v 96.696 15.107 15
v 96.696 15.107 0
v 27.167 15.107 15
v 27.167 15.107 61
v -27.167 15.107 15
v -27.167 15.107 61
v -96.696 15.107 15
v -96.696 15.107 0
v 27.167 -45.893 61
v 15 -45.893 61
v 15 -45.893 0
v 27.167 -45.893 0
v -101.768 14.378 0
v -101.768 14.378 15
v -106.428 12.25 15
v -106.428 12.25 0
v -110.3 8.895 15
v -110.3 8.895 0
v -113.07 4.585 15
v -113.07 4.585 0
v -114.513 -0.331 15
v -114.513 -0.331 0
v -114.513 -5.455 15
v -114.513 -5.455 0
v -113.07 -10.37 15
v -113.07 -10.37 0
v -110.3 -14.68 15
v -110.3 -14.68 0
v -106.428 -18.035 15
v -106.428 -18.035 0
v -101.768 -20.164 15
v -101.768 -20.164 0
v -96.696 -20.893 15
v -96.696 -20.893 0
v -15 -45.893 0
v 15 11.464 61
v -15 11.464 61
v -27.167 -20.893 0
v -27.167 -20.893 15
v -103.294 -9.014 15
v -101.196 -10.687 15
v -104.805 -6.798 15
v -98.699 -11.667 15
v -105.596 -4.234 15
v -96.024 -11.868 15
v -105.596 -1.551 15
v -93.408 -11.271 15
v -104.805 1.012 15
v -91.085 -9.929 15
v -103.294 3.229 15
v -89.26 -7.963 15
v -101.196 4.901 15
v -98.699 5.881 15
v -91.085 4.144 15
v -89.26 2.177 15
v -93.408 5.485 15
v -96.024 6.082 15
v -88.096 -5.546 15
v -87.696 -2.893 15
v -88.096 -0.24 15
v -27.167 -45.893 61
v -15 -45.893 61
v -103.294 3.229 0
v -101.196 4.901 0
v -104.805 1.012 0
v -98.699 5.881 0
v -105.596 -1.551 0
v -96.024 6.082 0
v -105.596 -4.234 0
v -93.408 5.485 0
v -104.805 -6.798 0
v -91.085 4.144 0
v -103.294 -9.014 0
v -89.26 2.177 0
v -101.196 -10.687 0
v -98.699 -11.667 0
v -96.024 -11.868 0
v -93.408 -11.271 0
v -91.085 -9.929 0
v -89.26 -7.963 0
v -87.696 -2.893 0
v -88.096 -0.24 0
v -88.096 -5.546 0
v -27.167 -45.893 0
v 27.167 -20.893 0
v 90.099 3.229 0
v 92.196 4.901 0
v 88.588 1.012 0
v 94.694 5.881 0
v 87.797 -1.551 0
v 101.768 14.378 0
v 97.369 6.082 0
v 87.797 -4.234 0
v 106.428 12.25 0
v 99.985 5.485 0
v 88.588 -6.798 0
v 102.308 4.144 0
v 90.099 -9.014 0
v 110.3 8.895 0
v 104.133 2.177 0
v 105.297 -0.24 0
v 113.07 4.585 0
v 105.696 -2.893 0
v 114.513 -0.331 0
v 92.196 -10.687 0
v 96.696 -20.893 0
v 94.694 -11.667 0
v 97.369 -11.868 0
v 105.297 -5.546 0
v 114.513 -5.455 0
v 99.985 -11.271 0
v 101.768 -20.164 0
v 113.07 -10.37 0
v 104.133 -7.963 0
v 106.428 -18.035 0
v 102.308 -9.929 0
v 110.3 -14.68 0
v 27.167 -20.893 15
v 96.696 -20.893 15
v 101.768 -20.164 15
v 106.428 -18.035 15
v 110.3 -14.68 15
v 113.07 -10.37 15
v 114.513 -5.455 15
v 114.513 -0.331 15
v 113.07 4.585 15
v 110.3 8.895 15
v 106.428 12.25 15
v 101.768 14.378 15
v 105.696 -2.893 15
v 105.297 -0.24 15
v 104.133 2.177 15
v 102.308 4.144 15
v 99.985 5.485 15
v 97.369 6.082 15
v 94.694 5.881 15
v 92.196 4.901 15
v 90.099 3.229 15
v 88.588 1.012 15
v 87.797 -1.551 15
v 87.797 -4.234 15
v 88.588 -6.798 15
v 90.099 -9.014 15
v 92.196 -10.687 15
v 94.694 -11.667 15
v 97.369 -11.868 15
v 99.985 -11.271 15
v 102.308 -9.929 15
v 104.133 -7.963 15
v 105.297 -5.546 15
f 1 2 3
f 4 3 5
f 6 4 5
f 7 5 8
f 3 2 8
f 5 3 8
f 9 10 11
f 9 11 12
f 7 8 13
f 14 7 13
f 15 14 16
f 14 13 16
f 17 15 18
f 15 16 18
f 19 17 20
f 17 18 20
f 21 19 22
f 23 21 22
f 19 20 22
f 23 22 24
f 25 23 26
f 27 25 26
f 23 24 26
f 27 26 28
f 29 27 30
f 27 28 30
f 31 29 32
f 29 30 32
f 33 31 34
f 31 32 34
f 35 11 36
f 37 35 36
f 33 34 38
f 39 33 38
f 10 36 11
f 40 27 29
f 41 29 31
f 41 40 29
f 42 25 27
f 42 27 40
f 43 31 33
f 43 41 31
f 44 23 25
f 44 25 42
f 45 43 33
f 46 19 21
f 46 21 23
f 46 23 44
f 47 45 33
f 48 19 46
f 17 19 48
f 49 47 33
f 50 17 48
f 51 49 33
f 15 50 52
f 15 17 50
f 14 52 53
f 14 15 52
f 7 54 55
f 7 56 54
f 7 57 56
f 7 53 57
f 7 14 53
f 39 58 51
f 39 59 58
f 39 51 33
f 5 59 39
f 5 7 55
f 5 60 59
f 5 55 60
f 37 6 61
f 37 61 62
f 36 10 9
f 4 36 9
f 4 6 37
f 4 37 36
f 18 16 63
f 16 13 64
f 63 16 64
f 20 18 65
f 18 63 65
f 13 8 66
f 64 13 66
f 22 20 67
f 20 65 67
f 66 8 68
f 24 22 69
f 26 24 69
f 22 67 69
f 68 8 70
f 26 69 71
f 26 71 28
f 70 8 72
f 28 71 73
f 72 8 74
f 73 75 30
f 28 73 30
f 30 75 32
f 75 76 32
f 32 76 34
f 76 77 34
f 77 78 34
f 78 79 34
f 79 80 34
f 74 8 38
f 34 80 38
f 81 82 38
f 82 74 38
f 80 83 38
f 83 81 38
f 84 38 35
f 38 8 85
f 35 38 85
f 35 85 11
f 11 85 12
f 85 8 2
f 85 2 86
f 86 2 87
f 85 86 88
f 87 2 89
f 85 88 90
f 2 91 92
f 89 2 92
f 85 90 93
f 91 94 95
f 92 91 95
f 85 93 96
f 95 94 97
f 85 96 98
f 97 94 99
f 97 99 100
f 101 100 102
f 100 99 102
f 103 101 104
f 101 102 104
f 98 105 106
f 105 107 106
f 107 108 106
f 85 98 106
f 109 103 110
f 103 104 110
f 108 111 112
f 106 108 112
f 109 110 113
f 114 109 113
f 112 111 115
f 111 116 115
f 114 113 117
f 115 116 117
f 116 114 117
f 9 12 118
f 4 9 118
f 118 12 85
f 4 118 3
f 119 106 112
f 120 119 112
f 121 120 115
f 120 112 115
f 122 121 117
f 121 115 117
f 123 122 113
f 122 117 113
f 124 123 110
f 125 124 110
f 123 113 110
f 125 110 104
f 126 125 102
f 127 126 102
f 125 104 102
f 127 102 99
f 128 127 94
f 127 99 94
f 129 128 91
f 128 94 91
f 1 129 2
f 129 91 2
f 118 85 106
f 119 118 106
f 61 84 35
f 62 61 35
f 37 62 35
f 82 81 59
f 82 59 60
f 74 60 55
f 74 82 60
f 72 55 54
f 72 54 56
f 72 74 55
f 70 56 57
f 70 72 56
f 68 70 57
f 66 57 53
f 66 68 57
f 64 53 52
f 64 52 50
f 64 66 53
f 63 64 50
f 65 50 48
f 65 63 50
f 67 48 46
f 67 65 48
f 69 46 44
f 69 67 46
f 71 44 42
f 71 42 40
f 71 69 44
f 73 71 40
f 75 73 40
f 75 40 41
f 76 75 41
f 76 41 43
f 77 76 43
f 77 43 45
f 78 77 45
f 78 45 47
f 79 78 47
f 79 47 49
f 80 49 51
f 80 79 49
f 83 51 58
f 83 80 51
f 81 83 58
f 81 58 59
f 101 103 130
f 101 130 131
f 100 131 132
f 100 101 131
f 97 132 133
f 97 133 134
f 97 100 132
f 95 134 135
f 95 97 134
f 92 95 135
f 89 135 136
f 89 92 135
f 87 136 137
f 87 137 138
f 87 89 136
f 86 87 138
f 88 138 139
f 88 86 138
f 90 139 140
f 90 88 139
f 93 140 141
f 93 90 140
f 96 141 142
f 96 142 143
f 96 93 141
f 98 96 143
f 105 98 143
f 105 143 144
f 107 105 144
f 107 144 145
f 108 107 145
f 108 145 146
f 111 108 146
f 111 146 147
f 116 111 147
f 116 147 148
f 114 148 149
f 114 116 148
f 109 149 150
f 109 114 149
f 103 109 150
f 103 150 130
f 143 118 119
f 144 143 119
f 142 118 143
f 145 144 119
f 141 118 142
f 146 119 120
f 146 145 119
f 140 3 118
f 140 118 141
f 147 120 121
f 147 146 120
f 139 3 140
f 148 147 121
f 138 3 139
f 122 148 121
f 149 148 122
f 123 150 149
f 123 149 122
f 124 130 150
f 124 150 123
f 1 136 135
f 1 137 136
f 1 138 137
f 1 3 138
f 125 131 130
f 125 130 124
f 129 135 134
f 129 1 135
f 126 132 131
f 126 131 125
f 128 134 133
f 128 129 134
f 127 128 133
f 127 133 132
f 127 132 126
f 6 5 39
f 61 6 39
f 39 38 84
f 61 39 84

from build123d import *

# Parameters (mm, degrees)
F1_DEPTH = 61
F0_R     = 9
F2_DEPTH = 15
F4_DEPTH = 30


with BuildPart() as f1:
    # F0 (on Top) → F1 (new body)
    with BuildSketch(Plane.XY):
        Polygon((0, 15.107143), (-27.166667, 15.107143), (-27.166667, -20.892857), (-27.166667, -45.892857), (-15, -45.892857), (-15, 11.464287), (0, 11.464287), (15, 11.464287), (15, -45.892857), (27.166667, -45.892857), (27.166667, -20.892857), (27.166667, 15.107143), align=None)
    extrude(amount=F1_DEPTH)

    # F0 (on Top) → F2 (join)
    with BuildSketch(Plane.XY):
        with BuildLine():
            Line((-27.166667, 15.107143), (-96.696436, 15.107143))
            ThreePointArc((-96.696436, 15.107143), (-114.696436, -2.892857), (-96.696436, -20.892857))
            ThreePointArc((-96.696436, -20.892857), (-93.708552, -20.64314), (-90.803571, -19.900918))
            Line((-90.803571, -19.900918), (-90.803571, -20.892857))
            Line((-90.803571, -20.892857), (-27.166667, -20.892857))
            Line((-27.166667, -20.892857), (-27.166667, 15.107143))
        make_face()
        with Locations((-96.696436, -2.892857)):
            Circle(F0_R, mode=Mode.SUBTRACT)
        Polygon((0, 15.107143), (-27.166667, 15.107143), (-27.166667, -20.892857), (-27.166667, -45.892857), (-15, -45.892857), (-15, 11.464287), (0, 11.464287), (15, 11.464287), (15, -45.892857), (27.166667, -45.892857), (27.166667, -20.892857), (27.166667, 15.107143), align=None)
        with BuildLine():
            ThreePointArc((-90.803571, -19.900918), (-93.708552, -20.64314), (-96.696436, -20.892857))
            Line((-96.696436, -20.892857), (-90.803571, -20.892857))
            Line((-90.803571, -20.892857), (-90.803571, -19.900918))
        make_face()
        with BuildLine():
            Line((96.696436, 15.107143), (27.166667, 15.107143))
            Line((27.166667, 15.107143), (27.166667, -20.892857))
            Line((27.166667, -20.892857), (96.696436, -20.892857))
            ThreePointArc((96.696436, -20.892857), (114.696436, -2.892857), (96.696436, 15.107143))
        make_face()
        with Locations((96.696436, -2.892857)):
            Circle(F0_R, mode=Mode.SUBTRACT)
    extrude(amount=F2_DEPTH)

    # F3 (on face) → F4 (join)
    with BuildSketch(Plane(origin=(15, 0, 0), x_dir=(0, -1, 0), z_dir=(-1, 0, 0))):
        Polygon((45.892857, 0), (-11.464287, 61), (-11.464287, 0), align=None)
    extrude(amount=F4_DEPTH)


solid = f1.part
